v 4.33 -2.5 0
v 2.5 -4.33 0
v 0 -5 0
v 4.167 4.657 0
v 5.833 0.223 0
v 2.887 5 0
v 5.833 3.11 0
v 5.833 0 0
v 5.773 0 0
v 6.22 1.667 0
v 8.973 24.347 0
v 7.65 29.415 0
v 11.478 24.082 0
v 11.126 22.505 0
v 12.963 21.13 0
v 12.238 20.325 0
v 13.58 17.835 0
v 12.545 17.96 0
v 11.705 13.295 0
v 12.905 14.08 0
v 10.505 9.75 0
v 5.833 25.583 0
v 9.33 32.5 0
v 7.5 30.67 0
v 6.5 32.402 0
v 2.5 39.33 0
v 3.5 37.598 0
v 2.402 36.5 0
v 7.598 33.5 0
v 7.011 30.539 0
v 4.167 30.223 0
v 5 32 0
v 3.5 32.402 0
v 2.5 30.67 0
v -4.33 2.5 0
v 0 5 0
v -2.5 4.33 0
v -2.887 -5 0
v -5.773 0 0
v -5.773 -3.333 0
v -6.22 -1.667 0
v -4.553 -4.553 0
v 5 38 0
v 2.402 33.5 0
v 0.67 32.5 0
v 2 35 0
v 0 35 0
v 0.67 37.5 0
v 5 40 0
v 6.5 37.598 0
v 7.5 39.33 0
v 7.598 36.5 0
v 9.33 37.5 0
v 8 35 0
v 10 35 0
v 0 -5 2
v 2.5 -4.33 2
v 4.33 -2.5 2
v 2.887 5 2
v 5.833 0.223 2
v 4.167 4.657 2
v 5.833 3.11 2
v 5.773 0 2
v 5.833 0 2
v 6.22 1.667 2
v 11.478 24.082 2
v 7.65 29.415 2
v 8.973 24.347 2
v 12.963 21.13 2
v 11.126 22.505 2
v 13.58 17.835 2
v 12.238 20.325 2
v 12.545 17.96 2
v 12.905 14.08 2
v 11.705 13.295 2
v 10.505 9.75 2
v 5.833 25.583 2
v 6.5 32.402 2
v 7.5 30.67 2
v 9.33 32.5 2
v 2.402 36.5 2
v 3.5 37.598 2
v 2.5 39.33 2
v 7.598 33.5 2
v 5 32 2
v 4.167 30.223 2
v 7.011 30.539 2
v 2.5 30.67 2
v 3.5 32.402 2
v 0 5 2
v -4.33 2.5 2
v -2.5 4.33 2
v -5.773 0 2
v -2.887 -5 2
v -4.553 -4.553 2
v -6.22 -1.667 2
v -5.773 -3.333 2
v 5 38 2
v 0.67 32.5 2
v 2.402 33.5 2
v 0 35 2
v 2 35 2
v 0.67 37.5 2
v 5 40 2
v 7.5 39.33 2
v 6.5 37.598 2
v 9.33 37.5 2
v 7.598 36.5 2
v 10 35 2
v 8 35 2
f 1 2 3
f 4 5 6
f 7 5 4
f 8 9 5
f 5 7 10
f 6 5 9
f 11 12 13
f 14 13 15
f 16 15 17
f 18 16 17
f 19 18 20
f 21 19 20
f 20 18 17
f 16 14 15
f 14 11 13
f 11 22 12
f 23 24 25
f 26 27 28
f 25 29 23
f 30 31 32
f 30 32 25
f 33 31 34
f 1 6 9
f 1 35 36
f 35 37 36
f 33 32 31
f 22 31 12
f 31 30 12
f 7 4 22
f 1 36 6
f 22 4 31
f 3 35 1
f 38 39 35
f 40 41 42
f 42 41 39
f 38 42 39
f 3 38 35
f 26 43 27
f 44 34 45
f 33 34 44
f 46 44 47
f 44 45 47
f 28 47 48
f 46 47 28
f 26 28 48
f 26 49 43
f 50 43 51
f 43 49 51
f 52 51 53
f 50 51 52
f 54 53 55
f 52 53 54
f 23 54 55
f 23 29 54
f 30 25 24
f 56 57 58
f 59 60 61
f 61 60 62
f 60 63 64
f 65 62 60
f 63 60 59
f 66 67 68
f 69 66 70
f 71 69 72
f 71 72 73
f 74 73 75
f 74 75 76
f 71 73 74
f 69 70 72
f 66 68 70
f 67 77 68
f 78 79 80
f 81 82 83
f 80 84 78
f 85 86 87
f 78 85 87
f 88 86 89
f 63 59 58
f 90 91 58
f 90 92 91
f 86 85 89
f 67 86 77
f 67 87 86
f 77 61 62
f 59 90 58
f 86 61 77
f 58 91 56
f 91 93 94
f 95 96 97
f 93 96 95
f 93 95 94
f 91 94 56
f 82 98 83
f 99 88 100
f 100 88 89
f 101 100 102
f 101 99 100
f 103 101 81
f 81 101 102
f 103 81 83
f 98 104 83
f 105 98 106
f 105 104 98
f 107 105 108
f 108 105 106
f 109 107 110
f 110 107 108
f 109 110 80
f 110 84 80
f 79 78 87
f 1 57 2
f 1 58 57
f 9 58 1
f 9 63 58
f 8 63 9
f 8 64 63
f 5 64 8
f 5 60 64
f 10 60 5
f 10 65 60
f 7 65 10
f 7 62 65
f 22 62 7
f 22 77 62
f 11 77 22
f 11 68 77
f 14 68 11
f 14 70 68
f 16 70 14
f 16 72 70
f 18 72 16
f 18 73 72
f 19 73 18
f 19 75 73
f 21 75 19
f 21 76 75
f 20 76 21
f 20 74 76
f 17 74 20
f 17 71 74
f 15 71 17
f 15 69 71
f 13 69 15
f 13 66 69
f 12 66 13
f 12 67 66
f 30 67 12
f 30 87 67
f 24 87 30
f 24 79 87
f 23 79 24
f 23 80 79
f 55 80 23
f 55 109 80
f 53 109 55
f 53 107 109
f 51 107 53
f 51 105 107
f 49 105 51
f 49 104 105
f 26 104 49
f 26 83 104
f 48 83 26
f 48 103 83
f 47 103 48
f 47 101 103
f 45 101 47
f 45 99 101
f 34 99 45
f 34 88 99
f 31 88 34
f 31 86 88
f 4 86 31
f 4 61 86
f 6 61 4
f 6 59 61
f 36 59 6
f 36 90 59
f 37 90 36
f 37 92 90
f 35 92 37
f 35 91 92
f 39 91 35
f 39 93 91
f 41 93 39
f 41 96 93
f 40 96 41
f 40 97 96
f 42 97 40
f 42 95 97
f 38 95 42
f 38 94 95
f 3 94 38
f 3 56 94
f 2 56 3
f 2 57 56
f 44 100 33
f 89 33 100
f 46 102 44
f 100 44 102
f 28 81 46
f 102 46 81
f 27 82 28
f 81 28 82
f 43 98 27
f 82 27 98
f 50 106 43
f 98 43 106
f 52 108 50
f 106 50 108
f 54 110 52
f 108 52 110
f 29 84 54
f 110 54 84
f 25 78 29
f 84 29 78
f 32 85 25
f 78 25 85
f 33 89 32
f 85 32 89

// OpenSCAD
theitem = "1/8"; // [alt,bass,violin,#,b,natural,1/1,1/2,1/4,1/8,1/16,1/32,1/1 break,1/2 break,1/4 break,1/8 break,1/16 break,1/32 break]

//height of the note-body. a normal note has a height of "3.5 * note_body_height"
note_body_height =10;
zeilenhoehe = note_body_height;

ring_x = 5;
ring_y = 35;
ring_inner_radius = 3;
ring_wallthickness = 2;

z_height = 2; 

$fn=11+1;



 
linear_extrude(height=z_height)
difference(){
	union(){
		item(theitem);
		translate([ring_x,ring_y,0])
			circle(r=ring_inner_radius+ring_wallthickness);
	}
	translate([ring_x,ring_y,0])
		circle(r=ring_inner_radius);
	
}



module item(item){

if(item == "violin"){
	violinschluessel(zeilenhoehe);
}else if(item == "bass"){
	bassschluessel(zeilenhoehe);
}else if(item == "alt"){
	altschluessel(zeilenhoehe);
}else if(item == "#"){
	translate([0,-zeilenhoehe + 5*(zeilenhoehe/2),0])
			vorzeichen("#", zeilenhoehe);
}else if(item == "b"){
	translate([0,-zeilenhoehe + 5*(zeilenhoehe/2),0])
			vorzeichen("b", zeilenhoehe);
}else if(item == "natural"){
	translate([0,-zeilenhoehe + 5*(zeilenhoehe/2),0])
			vorzeichen("n", zeilenhoehe);
}else if(item == "1/1"){	
	note(zeilenhoehe,"1/1",5);
}else if(item == "1/2"){	
	note(zeilenhoehe,"1/2",5);
}else if(item == "1/4"){	
	note(zeilenhoehe,"1/4",5);
}else if(item == "1/8"){	
	note(zeilenhoehe,"1/8",5);
}else if(item == "1/16"){	
	note(zeilenhoehe,"1/6",5);
}else if(item == "1/32"){	
	note(zeilenhoehe,"1/3",5);
}else if(item == "1/32"){	
	note(zeilenhoehe,"1/3",5);
}else if(item == "1/1 break"){	
	break(zeilenhoehe,"1/1");
}else if(item == "1/2 break"){	
	break(zeilenhoehe,"1/2");
}else if(item == "1/4 break"){	
	break(zeilenhoehe,"1/4");
}else if(item == "1/8 break"){	
	break(zeilenhoehe,"1/8");
}else if(item == "1/16 break"){	
	break(zeilenhoehe,"1/6");
}else if(item == "1/32 break"){	
	break(zeilenhoehe,"1/3");
}

}


/////////////////////////////////////





module note(zh,nw,tonhoehe){

	notenradius = zh/2;
	zweidrittel=notenradius*2/3;

	if(nw != "1/1"){

	difference(){
	union(){
			translate([zh/2-zweidrittel/4,0,0])
				square(size = [zweidrittel/2,zh*3.5]);
		rotate([0,0,30])
			hull(){
				circle(r = zh/2);
				translate([zweidrittel,0,0])
					circle(r = zweidrittel);
				translate([-zweidrittel,0,0])
					circle(r = zweidrittel);
			}
	}
		if(nw == "1/2"){
			rotate([0,0,30])
				hull(){
					translate([zh/4,0,0])
						circle(r = zh/4);

					translate([-zh/4,0,0])
						circle(r = zh/4);
				}
		}
	}

	
	if(nw == "1/8"){
		translate([tonhoehe >= 6 ? zh/2.5 : zh/2 + (zweidrittel/4.1),zh*2.85,0])
			if(tonhoehe >= 6)
				mirror(0,1,0)
					fahne(zh);
			else
				fahne(zh);
	}
	if(nw == "1/6"){
		for(i=[0:1])
		translate([tonhoehe >= 6 ? zh/2.5 : zh/2 + (zweidrittel/4.1),zh*2.85 - (i*zh),0])
			if(tonhoehe >= 6)
				mirror(0,1,0)
					fahne(zh);
			else
				fahne(zh);
	}
	if(nw == "1/3"){
		for(i=[-1:1])
		translate([tonhoehe >= 6 ? zh/2.5 : zh/2 + (zweidrittel/4.1),zh*2.85 - (i*zh),0])
			if(tonhoehe >= 6)
				mirror(0,1,0)
					fahne(zh);
			else
				fahne(zh);
		translate([zh/2-zweidrittel/4,zh,0])
				square(size = [zweidrittel/2,zh*3.5]);
	}


	}else{
difference(){
	union(){
			hull(){
				circle(r = zh/2);
				translate([zweidrittel,0,0])
					circle(r = zweidrittel);
				translate([-zweidrittel,0,0])
					circle(r = zweidrittel);
			}
	}

			rotate([0,0,-30])
				hull(){
					translate([zh/8,0,0])
						circle(r = zh/4);

					translate([-zh/8,0,0])
						circle(r = zh/4);
				}
}

	}
}



module fahne(zh){
scale(v = [zh/4, zh/4, zh/4])
translate([1.5,-2.5,0])
  polygon(points=
    [[-1.608, 1.379], [-0.236, 0.839], [0.625, 0.102], [1.070, -0.770], [1.193, -1.716], [0.857, -3.582], [0.377, -5.000], [1.337, -3.268], [1.607, -1.766], [1.360, -0.448], [0.766, 0.733], [-0.765, 2.866], [-1.359, 3.910], [-1.608, 5.000]]
    , paths=
    [[0, 1, 2, 3, 4, 5, 6, 7, 8, 9, 10, 11, 12, 13, 0]]
    );

}


module vorzeichen(vz, zh){
	if(vz == "#")
		vorzeichen_sharp(zh);
	if(vz == "b")
		vorzeichen_b(zh);
	if(vz == "n")
		vorzeichen_natural(zh);
}


module vorzeichen_sharp(zh) {
scale(v = [zh/5, zh/5, zh/5])
  polygon(points=
    [[0.676, 6.500], [0.676, 3.768], [-0.620, 3.194], [-0.620, 5.880], [-1.259, 5.880], [-1.259, 2.907], [-1.935, 2.611], [-1.935, 0.444], [-1.259, 0.741], [-1.259, -1.852], [-1.935, -2.148], [-1.935, -4.315], [-1.259, -4.018], [-1.259, -6.500], [-0.620, -6.500], [-0.620, -3.731], [0.676, -3.167], [0.676, -5.843], [1.315, -5.843], [1.315, -2.880], [1.935, -2.611], [1.935, -0.435], [1.315, -0.713], [1.315, 1.880], [1.935, 2.157], [1.935, 4.324], [1.315, 4.046], [1.315, 6.500], [0.676, 1.602], [0.676, -0.991], [-0.620, -1.565], [-0.620, 1.028]]
    , paths=
    [[0, 1, 2, 3, 4, 5, 6, 7, 8, 9, 10, 11, 12, 13, 14, 15, 16, 17, 18, 19, 20, 21, 22, 23, 24, 25, 26, 27, 0, 0], [28, 29, 30, 31, 28, 28]]
    );
}

module vorzeichen_b(zh) {
scale(v = [zh/5, zh/5, zh/5])
translate([0,3,0])
  polygon(points=
    [[-3.276, 7.500], [-3.276, -7.500], [-3.093, -7.500], [-0.500, -6.648], [1.446, -5.288], [2.710, -3.675], [3.256, -2.064], [3.049, -0.712], [2.054, 0.127], [0.236, 0.197], [-2.440, -0.758], [-2.440, 7.500], [-3.276, 7.500], [-0.009, -0.627], [0.711, -0.811], [1.005, -1.301], [0.585, -2.862], [-0.741, -4.638], [-2.440, -5.958], [-2.440, -1.280]]
    , paths=
    [[0, 1, 2, 3, 4, 5, 6, 7, 8, 9, 10, 11, 12, 0], [13, 14, 15, 16, 17, 18, 19, 13, 13]]
    );
}

module vorzeichen_natural(zh) {
scale(v = [zh/5, zh/5, zh/5])
  polygon(points=
    [[-1.915, 6.500], [-1.915, -3.955], [1.295, -1.911], [1.295, -6.500], [1.915, -6.500], [1.915, 3.955], [-1.268, 1.929], [-1.268, 6.500], [1.295, 1.837], [1.295, -0.190], [-1.268, -1.818], [-1.268, 0.208]]
    , paths=
    [[0, 1, 2, 3, 4, 5, 6, 7, 0], [8, 9, 10, 11, 8]]
    );
}


module break(zh,nw){
	if(nw == "1/1")
		pause_1_1(zh);
	if(nw == "1/2")
		pause_1_2(zh);
	if(nw == "1/4")
		pause_1_4(zh);
	if(nw == "1/8")
		pause_1_8(zh);
	if(nw == "1/6")
		pause_1_16(zh);
	if(nw == "1/3")
		pause_1_32(zh);
}


module pause_1_1(zh) {
translate([0,2.5*zh,0])
	square(size = [zh*2,zh*0.5]);
}

module pause_1_2(zh) {
translate([0,2*zh,0])
	square(size = [zh*2,zh*0.5]);
}

module pause_1_4(zh) {
translate([0,2*zh,0])
scale(v = [zh/5.5, zh/5.5, zh/5.5])
  polygon(points=
    [[-0.983, 7.462], [-1.147, 7.044], [-0.707, 6.498], [-0.039, 5.578], [0.121, 4.196], [-0.584, 2.939], [-1.172, 2.439], [-2.362, 1.138], [-2.407, 0.846], [-1.545, -0.471], [0.527, -2.922], [0.589, -2.983], [0.507, -2.942], [-1.205, -2.433], [-2.382, -2.442], [-2.677, -2.733], [-2.550, -4.386], [-1.402, -6.689], [-0.815, -7.465], [-0.605, -7.465], [-0.666, -7.174], [-1.124, -5.887], [-1.065, -4.554], [-0.605, -3.968], [0.668, -3.969], [1.907, -4.595], [2.075, -4.744], [2.494, -4.575], [2.346, -4.095], [0.778, -2.231], [0.191, -0.849], [0.372, 0.150], [0.946, 0.994], [1.530, 1.494], [2.744, 2.837], [2.600, 3.588], [0.946, 5.578], [-0.707, 7.483], [-0.983, 7.462]]
    , paths=
    [[0, 1, 2, 3, 4, 5, 6, 7, 8, 9, 10, 11, 12, 13, 14, 15, 16, 17, 18, 19, 20, 21, 22, 23, 24, 25, 26, 27, 28, 29, 30, 31, 32, 33, 34, 35, 36, 37, 38, 0]]
    );
}

module pause_1_8(zh) {
translate([0,2*zh,0])
scale(v = [zh/5.5, zh/5.5, zh/5.5])
  polygon(points=
    [[-1.481, 4.970], [-2.212, 4.617], [-2.667, 3.941], [-2.709, 3.489], [-2.537, 2.735], [-2.058, 2.169], [-1.355, 1.832], [-0.302, 1.807], [1.121, 2.152], [1.378, 2.241], [0.108, -1.269], [-1.140, -4.775], [-1.030, -4.843], [-0.536, -4.991], [0.088, -4.712], [1.421, -0.193], [2.711, 4.262], [2.669, 4.324], [2.218, 4.392], [2.066, 4.198], [1.121, 3.080], [0.539, 2.949], [0.150, 3.747], [-0.452, 4.802], [-1.481, 4.970]]
    , paths=
    [[0, 1, 2, 3, 4, 5, 6, 7, 8, 9, 10, 11, 12, 13, 14, 15, 16, 17, 18, 19, 20, 21, 22, 23, 24, 0]]
    );
}

module pause_1_16(zh) {
translate([0,1.5*zh,0])
scale(v = [zh/5.5, zh/5.5, zh/5.5])
  polygon(points=
    [[-0.573, 7.468], [-1.285, 7.123], [-1.724, 6.464], [-1.769, 6.024], [-1.601, 5.288], [-1.134, 4.737], [-0.445, 4.408], [0.557, 4.374], [1.924, 4.700], [2.194, 4.786], [1.212, 1.595], [0.434, 0.506], [-0.235, 0.254], [-0.614, 1.032], [-0.971, 1.846], [-1.808, 2.254], [-2.753, 2.014], [-3.361, 1.216], [-3.406, 0.777], [-3.238, 0.044], [-2.771, -0.507], [-2.082, -0.836], [-0.865, -0.836], [0.266, -0.543], [0.583, -0.461], [-1.515, -7.255], [-1.182, -7.444], [-0.676, -7.444], [-0.343, -7.235], [1.545, -0.206], [3.413, 6.777], [3.371, 6.838], [2.972, 6.924], [2.639, 6.505], [1.965, 5.646], [1.401, 5.498], [1.023, 6.275], [0.434, 7.303], [-0.573, 7.468]]
    , paths=
    [[0, 1, 2, 3, 4, 5, 6, 7, 8, 9, 10, 11, 12, 13, 14, 15, 16, 17, 18, 19, 20, 21, 22, 23, 24, 25, 26, 27, 28, 29, 30, 31, 32, 33, 34, 35, 36, 37, 38, 0]]
    );
}

module pause_1_32(zh) {
translate([0,2*zh,0])
scale(v = [zh/5.5, zh/5.5, zh/5.5])
  polygon(points=
    [[0.122, 9.959], [-0.580, 9.615], [-1.016, 8.963], [-1.061, 8.528], [-1.016, 8.093], [-0.689, 7.491], [-0.126, 7.078], [0.764, 6.891], [2.488, 7.200], [2.817, 7.306], [2.402, 5.708], [1.926, 3.969], [1.179, 2.973], [0.642, 2.826], [0.269, 3.594], [-0.085, 4.404], [-0.912, 4.803], [-1.846, 4.566], [-2.447, 3.782], [-2.492, 3.347], [-2.324, 2.619], [-1.863, 2.074], [-1.183, 1.749], [0.020, 1.749], [1.138, 2.038], [1.471, 2.144], [0.597, -1.092], [-0.147, -2.129], [-0.789, -2.357], [-1.162, -1.588], [-1.516, -0.783], [-2.343, -0.380], [-3.276, -0.617], [-3.878, -1.405], [-3.923, -1.839], [-3.878, -2.274], [-3.550, -2.876], [-2.987, -3.291], [-2.077, -3.478], [-1.370, -3.433], [-0.166, -3.124], [0.102, -3.018], [0.102, -3.084], [-1.682, -9.758], [-1.102, -10.005], [-0.520, -9.758], [1.740, -0.222], [3.919, 9.317], [3.625, 9.439], [3.272, 9.110], [2.467, 8.029], [2.073, 8.008], [1.699, 8.777], [1.118, 9.793], [0.122, 9.959]]
    , paths=
    [[0, 1, 2, 3, 4, 5, 6, 7, 8, 9, 10, 11, 12, 13, 14, 15, 16, 17, 18, 19, 20, 21, 22, 23, 24, 25, 26, 27, 28, 29, 30, 31, 32, 33, 34, 35, 36, 37, 38, 39, 40, 41, 42, 43, 44, 45, 46, 47, 48, 49, 50, 51, 52, 53, 54, 0]]
    );
}


module altschluessel(zh) {
scale(v = [zh/6.2, zh/6.2, zh/6.2])
translate([0,12.5,0])
  polygon(points=
    [[-8.123, -12.484], [-8.123, 11.892], [-8.123, 12.431], [-5.302, 12.431], [-5.302, -11.945], [-5.302, -12.484], [-3.880, -12.484], [-3.880, 11.892], [-3.880, 12.431], [-2.979, 12.431], [-2.979, 0.222], [-1.632, 1.681], [-0.497, 4.038], [-0.019, 5.888], [0.638, 3.753], [1.657, 2.611], [2.792, 2.273], [3.946, 2.591], [4.584, 3.552], [4.966, 6.692], [4.924, 8.203], [4.711, 9.556], [4.171, 10.782], [3.142, 11.522], [2.007, 11.681], [1.158, 11.501], [0.776, 10.994], [1.179, 10.317], [1.635, 9.736], [1.763, 9.186], [1.317, 8.097], [0.129, 7.643], [-1.059, 8.171], [-1.536, 9.429], [-1.331, 10.332], [-0.847, 11.100], [0.723, 12.135], [2.611, 12.484], [4.680, 12.104], [6.451, 10.983], [7.681, 9.165], [8.127, 6.744], [7.953, 5.033], [7.438, 3.647], [6.642, 2.572], [5.656, 1.829], [3.333, 1.216], [1.211, 1.787], [0.087, -0.031], [1.211, -1.839], [3.492, -1.363], [4.815, -1.567], [5.963, -2.167], [6.893, -3.089], [7.575, -4.249], [8.127, -6.892], [7.960, -8.333], [7.459, -9.672], [6.655, -10.824], [5.581, -11.723], [4.274, -12.293], [2.792, -12.484], [1.113, -12.229], [-0.263, -11.617], [-1.179, -10.644], [-1.483, -9.291], [-0.942, -8.129], [0.087, -7.653], [1.285, -8.129], [1.816, -9.291], [1.688, -9.799], [1.317, -10.338], [0.967, -10.782], [0.829, -11.152], [1.190, -11.628], [2.102, -11.860], [3.559, -11.450], [4.436, -10.391], [4.865, -8.816], [5.008, -6.892], [4.595, -3.699], [3.940, -2.668], [2.792, -2.325], [1.694, -2.590], [0.882, -3.393], [0.023, -5.898], [-0.635, -3.551], [-1.706, -1.554], [-2.979, -0.222], [-2.979, -12.484], [-3.880, -12.484]]
    , paths=
    [[0, 1, 2, 3, 4, 5, 0, 0], [6, 7, 8, 9, 10, 11, 12, 13, 14, 15, 16, 17, 18, 19, 20, 21, 22, 23, 24, 25, 26, 27, 28, 29, 30, 31, 32, 33, 34, 35, 36, 37, 38, 39, 40, 41, 42, 43, 44, 45, 46, 47, 48, 49, 50, 51, 52, 53, 54, 55, 56, 57, 58, 59, 60, 61, 62, 63, 64, 65, 66, 67, 68, 69, 70, 71, 72, 73, 74, 75, 76, 77, 78, 79, 80, 81, 82, 83, 84, 85, 86, 87, 88, 89, 90, 6]]
    );}





module bassschluessel(zh) {
translate([0,zh*1.3,0])
scale(v = [zh/6.2, zh/6.2, zh/6.2])
translate([0,7.5,0])
  polygon(points=
    [[-6.497, -7.077], [-3.725, -5.161], [-1.850, -3.543], [-0.220, -1.360], [0.670, 0.713], [1.064, 2.959], [0.796, 4.860], [-0.102, 6.360], [-0.835, 6.802], [-1.763, 6.949], [-3.630, 6.556], [-4.367, 6.036], [-4.843, 5.268], [-4.922, 5.040], [-4.725, 4.750], [-4.410, 4.648], [-4.024, 4.718], [-3.496, 4.797], [-2.370, 4.357], [-1.874, 3.297], [-2.126, 2.457], [-2.811, 1.836], [-3.772, 1.609], [-4.646, 1.751], [-5.379, 2.182], [-5.868, 2.850], [-6.032, 3.690], [-5.850, 4.798], [-5.308, 5.747], [-3.449, 7.051], [-1.173, 7.491], [0.060, 7.331], [1.222, 6.847], [2.234, 6.090], [3.010, 5.103], [3.510, 3.959], [3.679, 2.732], [3.301, 0.551], [2.167, -1.470], [0.476, -3.285], [-1.574, -4.847], [-6.387, -7.486], [4.443, 5.072], [4.750, 5.779], [5.483, 6.069], [6.184, 5.747], [6.499, 5.033], [6.184, 4.310], [5.443, 4.027], [4.727, 4.334], [4.443, 0.957], [4.735, 1.671], [5.483, 1.962], [6.184, 1.648], [6.499, 0.957], [6.200, 0.211], [5.483, -0.088], [4.735, 0.203]]
    , paths=
    [[0, 1, 2, 3, 4, 5, 6, 7, 8, 9, 10, 11, 12, 13, 14, 15, 16, 17, 18, 19, 20, 21, 22, 23, 24, 25, 26, 27, 28, 29, 30, 31, 32, 33, 34, 35, 36, 37, 38, 39, 40, 41, 0, 0], [42, 43, 44, 45, 46, 47, 48, 49, 42, 42], [50, 51, 52, 53, 54, 55, 56, 57, 50, 50]]
    );}



module violinschluessel(zh) {
scale(v = [zh/5.2, zh/5.2, zh/5.2])
translate([0,9.5,0])
  polygon(points=
    [[0.832, -1.806], [-0.578, -2.778], [-1.061, -3.577], [-1.220, -4.447], [-0.848, -5.711], [0.249, -6.726], [0.485, -6.967], [0.283, -7.088], [-0.767, -6.625], [-1.608, -5.840], [-2.165, -4.819], [-2.368, -3.656], [-2.153, -2.373], [-1.583, -1.187], [-0.715, -0.206], [0.367, 0.439], [-0.215, 3.492], [-1.983, 1.806], [-3.390, 0.043], [-4.321, -1.828], [-4.664, -3.854], [-4.284, -5.677], [-3.221, -7.294], [-1.577, -8.405], [0.485, -8.825], [2.140, -8.541], [1.439, -1.720], [2.756, -8.335], [3.610, -7.818], [4.219, -7.066], [4.706, -4.869], [4.175, -3.269], [3.052, -2.133], [-0.291, 7.225], [0.654, 8.120], [1.659, 9.574], [2.444, 11.277], [2.731, 12.885], [2.672, 13.505], [2.385, 14.218], [1.769, 14.459], [1.047, 14.221], [0.401, 13.505], [-0.359, 11.561], [-0.680, 9.324], [-0.823, 6.726], [-1.456, 10.984], [-1.178, 13.591], [-0.443, 15.698], [0.637, 17.066], [1.406, 17.487], [1.693, 17.367], [2.022, 16.988], [3.154, 14.583], [3.533, 11.733], [3.153, 8.868], [2.064, 6.202], [0.333, 4.000], [1.017, 0.611], [1.786, 0.688], [3.533, 0.275], [4.892, -0.843], [5.753, -2.443], [6.057, -4.327], [5.861, -5.784], [5.272, -7.105], [4.290, -8.190], [2.908, -8.946], [3.271, -10.761], [3.651, -12.644], [3.769, -13.995], [3.288, -15.810], [1.963, -17.048], [0.148, -17.487], [-1.157, -17.288], [-2.284, -16.696], [-3.079, -15.758], [-3.381, -14.537], [-3.094, -13.393], [-2.402, -12.515], [-1.372, -12.137], [-0.435, -12.412], [0.266, -13.169], [0.528, -14.218], [0.021, -15.509], [-1.262, -16.042], [-1.456, -16.042], [-0.804, -16.627], [0.165, -16.825], [1.321, -16.584], [2.326, -15.930], [2.866, -15.053], [3.077, -13.599], [2.959, -12.361], [2.604, -10.743], [2.258, -9.212], [0.680, -9.410], [-0.663, -9.267], [-1.929, -8.834], [-4.090, -7.225], [-5.534, -4.886], [-6.057, -2.159], [-5.559, 0.353], [-4.386, 2.615], [-2.891, 4.542]]
    , paths=
    [[0, 1, 2, 3, 4, 5, 6, 7, 8, 9, 10, 11, 12, 13, 14, 15, 16, 17, 18, 19, 20, 21, 22, 23, 24, 25, 0, 0], [26, 27, 28, 29, 30, 31, 32, 26, 26], [33, 34, 35, 36, 37, 38, 39, 40, 41, 42, 43, 44, 33, 33], [45, 46, 47, 48, 49, 50, 51, 52, 53, 54, 55, 56, 57, 58, 59, 60, 61, 62, 63, 64, 65, 66, 67, 68, 69, 70, 71, 72, 73, 74, 75, 76, 77, 78, 79, 80, 81, 82, 83, 84, 85, 86, 87, 88, 89, 90, 91, 92, 93, 94, 95, 96, 97, 98, 99, 100, 101, 102, 103, 104, 45, 45]]
    );}
